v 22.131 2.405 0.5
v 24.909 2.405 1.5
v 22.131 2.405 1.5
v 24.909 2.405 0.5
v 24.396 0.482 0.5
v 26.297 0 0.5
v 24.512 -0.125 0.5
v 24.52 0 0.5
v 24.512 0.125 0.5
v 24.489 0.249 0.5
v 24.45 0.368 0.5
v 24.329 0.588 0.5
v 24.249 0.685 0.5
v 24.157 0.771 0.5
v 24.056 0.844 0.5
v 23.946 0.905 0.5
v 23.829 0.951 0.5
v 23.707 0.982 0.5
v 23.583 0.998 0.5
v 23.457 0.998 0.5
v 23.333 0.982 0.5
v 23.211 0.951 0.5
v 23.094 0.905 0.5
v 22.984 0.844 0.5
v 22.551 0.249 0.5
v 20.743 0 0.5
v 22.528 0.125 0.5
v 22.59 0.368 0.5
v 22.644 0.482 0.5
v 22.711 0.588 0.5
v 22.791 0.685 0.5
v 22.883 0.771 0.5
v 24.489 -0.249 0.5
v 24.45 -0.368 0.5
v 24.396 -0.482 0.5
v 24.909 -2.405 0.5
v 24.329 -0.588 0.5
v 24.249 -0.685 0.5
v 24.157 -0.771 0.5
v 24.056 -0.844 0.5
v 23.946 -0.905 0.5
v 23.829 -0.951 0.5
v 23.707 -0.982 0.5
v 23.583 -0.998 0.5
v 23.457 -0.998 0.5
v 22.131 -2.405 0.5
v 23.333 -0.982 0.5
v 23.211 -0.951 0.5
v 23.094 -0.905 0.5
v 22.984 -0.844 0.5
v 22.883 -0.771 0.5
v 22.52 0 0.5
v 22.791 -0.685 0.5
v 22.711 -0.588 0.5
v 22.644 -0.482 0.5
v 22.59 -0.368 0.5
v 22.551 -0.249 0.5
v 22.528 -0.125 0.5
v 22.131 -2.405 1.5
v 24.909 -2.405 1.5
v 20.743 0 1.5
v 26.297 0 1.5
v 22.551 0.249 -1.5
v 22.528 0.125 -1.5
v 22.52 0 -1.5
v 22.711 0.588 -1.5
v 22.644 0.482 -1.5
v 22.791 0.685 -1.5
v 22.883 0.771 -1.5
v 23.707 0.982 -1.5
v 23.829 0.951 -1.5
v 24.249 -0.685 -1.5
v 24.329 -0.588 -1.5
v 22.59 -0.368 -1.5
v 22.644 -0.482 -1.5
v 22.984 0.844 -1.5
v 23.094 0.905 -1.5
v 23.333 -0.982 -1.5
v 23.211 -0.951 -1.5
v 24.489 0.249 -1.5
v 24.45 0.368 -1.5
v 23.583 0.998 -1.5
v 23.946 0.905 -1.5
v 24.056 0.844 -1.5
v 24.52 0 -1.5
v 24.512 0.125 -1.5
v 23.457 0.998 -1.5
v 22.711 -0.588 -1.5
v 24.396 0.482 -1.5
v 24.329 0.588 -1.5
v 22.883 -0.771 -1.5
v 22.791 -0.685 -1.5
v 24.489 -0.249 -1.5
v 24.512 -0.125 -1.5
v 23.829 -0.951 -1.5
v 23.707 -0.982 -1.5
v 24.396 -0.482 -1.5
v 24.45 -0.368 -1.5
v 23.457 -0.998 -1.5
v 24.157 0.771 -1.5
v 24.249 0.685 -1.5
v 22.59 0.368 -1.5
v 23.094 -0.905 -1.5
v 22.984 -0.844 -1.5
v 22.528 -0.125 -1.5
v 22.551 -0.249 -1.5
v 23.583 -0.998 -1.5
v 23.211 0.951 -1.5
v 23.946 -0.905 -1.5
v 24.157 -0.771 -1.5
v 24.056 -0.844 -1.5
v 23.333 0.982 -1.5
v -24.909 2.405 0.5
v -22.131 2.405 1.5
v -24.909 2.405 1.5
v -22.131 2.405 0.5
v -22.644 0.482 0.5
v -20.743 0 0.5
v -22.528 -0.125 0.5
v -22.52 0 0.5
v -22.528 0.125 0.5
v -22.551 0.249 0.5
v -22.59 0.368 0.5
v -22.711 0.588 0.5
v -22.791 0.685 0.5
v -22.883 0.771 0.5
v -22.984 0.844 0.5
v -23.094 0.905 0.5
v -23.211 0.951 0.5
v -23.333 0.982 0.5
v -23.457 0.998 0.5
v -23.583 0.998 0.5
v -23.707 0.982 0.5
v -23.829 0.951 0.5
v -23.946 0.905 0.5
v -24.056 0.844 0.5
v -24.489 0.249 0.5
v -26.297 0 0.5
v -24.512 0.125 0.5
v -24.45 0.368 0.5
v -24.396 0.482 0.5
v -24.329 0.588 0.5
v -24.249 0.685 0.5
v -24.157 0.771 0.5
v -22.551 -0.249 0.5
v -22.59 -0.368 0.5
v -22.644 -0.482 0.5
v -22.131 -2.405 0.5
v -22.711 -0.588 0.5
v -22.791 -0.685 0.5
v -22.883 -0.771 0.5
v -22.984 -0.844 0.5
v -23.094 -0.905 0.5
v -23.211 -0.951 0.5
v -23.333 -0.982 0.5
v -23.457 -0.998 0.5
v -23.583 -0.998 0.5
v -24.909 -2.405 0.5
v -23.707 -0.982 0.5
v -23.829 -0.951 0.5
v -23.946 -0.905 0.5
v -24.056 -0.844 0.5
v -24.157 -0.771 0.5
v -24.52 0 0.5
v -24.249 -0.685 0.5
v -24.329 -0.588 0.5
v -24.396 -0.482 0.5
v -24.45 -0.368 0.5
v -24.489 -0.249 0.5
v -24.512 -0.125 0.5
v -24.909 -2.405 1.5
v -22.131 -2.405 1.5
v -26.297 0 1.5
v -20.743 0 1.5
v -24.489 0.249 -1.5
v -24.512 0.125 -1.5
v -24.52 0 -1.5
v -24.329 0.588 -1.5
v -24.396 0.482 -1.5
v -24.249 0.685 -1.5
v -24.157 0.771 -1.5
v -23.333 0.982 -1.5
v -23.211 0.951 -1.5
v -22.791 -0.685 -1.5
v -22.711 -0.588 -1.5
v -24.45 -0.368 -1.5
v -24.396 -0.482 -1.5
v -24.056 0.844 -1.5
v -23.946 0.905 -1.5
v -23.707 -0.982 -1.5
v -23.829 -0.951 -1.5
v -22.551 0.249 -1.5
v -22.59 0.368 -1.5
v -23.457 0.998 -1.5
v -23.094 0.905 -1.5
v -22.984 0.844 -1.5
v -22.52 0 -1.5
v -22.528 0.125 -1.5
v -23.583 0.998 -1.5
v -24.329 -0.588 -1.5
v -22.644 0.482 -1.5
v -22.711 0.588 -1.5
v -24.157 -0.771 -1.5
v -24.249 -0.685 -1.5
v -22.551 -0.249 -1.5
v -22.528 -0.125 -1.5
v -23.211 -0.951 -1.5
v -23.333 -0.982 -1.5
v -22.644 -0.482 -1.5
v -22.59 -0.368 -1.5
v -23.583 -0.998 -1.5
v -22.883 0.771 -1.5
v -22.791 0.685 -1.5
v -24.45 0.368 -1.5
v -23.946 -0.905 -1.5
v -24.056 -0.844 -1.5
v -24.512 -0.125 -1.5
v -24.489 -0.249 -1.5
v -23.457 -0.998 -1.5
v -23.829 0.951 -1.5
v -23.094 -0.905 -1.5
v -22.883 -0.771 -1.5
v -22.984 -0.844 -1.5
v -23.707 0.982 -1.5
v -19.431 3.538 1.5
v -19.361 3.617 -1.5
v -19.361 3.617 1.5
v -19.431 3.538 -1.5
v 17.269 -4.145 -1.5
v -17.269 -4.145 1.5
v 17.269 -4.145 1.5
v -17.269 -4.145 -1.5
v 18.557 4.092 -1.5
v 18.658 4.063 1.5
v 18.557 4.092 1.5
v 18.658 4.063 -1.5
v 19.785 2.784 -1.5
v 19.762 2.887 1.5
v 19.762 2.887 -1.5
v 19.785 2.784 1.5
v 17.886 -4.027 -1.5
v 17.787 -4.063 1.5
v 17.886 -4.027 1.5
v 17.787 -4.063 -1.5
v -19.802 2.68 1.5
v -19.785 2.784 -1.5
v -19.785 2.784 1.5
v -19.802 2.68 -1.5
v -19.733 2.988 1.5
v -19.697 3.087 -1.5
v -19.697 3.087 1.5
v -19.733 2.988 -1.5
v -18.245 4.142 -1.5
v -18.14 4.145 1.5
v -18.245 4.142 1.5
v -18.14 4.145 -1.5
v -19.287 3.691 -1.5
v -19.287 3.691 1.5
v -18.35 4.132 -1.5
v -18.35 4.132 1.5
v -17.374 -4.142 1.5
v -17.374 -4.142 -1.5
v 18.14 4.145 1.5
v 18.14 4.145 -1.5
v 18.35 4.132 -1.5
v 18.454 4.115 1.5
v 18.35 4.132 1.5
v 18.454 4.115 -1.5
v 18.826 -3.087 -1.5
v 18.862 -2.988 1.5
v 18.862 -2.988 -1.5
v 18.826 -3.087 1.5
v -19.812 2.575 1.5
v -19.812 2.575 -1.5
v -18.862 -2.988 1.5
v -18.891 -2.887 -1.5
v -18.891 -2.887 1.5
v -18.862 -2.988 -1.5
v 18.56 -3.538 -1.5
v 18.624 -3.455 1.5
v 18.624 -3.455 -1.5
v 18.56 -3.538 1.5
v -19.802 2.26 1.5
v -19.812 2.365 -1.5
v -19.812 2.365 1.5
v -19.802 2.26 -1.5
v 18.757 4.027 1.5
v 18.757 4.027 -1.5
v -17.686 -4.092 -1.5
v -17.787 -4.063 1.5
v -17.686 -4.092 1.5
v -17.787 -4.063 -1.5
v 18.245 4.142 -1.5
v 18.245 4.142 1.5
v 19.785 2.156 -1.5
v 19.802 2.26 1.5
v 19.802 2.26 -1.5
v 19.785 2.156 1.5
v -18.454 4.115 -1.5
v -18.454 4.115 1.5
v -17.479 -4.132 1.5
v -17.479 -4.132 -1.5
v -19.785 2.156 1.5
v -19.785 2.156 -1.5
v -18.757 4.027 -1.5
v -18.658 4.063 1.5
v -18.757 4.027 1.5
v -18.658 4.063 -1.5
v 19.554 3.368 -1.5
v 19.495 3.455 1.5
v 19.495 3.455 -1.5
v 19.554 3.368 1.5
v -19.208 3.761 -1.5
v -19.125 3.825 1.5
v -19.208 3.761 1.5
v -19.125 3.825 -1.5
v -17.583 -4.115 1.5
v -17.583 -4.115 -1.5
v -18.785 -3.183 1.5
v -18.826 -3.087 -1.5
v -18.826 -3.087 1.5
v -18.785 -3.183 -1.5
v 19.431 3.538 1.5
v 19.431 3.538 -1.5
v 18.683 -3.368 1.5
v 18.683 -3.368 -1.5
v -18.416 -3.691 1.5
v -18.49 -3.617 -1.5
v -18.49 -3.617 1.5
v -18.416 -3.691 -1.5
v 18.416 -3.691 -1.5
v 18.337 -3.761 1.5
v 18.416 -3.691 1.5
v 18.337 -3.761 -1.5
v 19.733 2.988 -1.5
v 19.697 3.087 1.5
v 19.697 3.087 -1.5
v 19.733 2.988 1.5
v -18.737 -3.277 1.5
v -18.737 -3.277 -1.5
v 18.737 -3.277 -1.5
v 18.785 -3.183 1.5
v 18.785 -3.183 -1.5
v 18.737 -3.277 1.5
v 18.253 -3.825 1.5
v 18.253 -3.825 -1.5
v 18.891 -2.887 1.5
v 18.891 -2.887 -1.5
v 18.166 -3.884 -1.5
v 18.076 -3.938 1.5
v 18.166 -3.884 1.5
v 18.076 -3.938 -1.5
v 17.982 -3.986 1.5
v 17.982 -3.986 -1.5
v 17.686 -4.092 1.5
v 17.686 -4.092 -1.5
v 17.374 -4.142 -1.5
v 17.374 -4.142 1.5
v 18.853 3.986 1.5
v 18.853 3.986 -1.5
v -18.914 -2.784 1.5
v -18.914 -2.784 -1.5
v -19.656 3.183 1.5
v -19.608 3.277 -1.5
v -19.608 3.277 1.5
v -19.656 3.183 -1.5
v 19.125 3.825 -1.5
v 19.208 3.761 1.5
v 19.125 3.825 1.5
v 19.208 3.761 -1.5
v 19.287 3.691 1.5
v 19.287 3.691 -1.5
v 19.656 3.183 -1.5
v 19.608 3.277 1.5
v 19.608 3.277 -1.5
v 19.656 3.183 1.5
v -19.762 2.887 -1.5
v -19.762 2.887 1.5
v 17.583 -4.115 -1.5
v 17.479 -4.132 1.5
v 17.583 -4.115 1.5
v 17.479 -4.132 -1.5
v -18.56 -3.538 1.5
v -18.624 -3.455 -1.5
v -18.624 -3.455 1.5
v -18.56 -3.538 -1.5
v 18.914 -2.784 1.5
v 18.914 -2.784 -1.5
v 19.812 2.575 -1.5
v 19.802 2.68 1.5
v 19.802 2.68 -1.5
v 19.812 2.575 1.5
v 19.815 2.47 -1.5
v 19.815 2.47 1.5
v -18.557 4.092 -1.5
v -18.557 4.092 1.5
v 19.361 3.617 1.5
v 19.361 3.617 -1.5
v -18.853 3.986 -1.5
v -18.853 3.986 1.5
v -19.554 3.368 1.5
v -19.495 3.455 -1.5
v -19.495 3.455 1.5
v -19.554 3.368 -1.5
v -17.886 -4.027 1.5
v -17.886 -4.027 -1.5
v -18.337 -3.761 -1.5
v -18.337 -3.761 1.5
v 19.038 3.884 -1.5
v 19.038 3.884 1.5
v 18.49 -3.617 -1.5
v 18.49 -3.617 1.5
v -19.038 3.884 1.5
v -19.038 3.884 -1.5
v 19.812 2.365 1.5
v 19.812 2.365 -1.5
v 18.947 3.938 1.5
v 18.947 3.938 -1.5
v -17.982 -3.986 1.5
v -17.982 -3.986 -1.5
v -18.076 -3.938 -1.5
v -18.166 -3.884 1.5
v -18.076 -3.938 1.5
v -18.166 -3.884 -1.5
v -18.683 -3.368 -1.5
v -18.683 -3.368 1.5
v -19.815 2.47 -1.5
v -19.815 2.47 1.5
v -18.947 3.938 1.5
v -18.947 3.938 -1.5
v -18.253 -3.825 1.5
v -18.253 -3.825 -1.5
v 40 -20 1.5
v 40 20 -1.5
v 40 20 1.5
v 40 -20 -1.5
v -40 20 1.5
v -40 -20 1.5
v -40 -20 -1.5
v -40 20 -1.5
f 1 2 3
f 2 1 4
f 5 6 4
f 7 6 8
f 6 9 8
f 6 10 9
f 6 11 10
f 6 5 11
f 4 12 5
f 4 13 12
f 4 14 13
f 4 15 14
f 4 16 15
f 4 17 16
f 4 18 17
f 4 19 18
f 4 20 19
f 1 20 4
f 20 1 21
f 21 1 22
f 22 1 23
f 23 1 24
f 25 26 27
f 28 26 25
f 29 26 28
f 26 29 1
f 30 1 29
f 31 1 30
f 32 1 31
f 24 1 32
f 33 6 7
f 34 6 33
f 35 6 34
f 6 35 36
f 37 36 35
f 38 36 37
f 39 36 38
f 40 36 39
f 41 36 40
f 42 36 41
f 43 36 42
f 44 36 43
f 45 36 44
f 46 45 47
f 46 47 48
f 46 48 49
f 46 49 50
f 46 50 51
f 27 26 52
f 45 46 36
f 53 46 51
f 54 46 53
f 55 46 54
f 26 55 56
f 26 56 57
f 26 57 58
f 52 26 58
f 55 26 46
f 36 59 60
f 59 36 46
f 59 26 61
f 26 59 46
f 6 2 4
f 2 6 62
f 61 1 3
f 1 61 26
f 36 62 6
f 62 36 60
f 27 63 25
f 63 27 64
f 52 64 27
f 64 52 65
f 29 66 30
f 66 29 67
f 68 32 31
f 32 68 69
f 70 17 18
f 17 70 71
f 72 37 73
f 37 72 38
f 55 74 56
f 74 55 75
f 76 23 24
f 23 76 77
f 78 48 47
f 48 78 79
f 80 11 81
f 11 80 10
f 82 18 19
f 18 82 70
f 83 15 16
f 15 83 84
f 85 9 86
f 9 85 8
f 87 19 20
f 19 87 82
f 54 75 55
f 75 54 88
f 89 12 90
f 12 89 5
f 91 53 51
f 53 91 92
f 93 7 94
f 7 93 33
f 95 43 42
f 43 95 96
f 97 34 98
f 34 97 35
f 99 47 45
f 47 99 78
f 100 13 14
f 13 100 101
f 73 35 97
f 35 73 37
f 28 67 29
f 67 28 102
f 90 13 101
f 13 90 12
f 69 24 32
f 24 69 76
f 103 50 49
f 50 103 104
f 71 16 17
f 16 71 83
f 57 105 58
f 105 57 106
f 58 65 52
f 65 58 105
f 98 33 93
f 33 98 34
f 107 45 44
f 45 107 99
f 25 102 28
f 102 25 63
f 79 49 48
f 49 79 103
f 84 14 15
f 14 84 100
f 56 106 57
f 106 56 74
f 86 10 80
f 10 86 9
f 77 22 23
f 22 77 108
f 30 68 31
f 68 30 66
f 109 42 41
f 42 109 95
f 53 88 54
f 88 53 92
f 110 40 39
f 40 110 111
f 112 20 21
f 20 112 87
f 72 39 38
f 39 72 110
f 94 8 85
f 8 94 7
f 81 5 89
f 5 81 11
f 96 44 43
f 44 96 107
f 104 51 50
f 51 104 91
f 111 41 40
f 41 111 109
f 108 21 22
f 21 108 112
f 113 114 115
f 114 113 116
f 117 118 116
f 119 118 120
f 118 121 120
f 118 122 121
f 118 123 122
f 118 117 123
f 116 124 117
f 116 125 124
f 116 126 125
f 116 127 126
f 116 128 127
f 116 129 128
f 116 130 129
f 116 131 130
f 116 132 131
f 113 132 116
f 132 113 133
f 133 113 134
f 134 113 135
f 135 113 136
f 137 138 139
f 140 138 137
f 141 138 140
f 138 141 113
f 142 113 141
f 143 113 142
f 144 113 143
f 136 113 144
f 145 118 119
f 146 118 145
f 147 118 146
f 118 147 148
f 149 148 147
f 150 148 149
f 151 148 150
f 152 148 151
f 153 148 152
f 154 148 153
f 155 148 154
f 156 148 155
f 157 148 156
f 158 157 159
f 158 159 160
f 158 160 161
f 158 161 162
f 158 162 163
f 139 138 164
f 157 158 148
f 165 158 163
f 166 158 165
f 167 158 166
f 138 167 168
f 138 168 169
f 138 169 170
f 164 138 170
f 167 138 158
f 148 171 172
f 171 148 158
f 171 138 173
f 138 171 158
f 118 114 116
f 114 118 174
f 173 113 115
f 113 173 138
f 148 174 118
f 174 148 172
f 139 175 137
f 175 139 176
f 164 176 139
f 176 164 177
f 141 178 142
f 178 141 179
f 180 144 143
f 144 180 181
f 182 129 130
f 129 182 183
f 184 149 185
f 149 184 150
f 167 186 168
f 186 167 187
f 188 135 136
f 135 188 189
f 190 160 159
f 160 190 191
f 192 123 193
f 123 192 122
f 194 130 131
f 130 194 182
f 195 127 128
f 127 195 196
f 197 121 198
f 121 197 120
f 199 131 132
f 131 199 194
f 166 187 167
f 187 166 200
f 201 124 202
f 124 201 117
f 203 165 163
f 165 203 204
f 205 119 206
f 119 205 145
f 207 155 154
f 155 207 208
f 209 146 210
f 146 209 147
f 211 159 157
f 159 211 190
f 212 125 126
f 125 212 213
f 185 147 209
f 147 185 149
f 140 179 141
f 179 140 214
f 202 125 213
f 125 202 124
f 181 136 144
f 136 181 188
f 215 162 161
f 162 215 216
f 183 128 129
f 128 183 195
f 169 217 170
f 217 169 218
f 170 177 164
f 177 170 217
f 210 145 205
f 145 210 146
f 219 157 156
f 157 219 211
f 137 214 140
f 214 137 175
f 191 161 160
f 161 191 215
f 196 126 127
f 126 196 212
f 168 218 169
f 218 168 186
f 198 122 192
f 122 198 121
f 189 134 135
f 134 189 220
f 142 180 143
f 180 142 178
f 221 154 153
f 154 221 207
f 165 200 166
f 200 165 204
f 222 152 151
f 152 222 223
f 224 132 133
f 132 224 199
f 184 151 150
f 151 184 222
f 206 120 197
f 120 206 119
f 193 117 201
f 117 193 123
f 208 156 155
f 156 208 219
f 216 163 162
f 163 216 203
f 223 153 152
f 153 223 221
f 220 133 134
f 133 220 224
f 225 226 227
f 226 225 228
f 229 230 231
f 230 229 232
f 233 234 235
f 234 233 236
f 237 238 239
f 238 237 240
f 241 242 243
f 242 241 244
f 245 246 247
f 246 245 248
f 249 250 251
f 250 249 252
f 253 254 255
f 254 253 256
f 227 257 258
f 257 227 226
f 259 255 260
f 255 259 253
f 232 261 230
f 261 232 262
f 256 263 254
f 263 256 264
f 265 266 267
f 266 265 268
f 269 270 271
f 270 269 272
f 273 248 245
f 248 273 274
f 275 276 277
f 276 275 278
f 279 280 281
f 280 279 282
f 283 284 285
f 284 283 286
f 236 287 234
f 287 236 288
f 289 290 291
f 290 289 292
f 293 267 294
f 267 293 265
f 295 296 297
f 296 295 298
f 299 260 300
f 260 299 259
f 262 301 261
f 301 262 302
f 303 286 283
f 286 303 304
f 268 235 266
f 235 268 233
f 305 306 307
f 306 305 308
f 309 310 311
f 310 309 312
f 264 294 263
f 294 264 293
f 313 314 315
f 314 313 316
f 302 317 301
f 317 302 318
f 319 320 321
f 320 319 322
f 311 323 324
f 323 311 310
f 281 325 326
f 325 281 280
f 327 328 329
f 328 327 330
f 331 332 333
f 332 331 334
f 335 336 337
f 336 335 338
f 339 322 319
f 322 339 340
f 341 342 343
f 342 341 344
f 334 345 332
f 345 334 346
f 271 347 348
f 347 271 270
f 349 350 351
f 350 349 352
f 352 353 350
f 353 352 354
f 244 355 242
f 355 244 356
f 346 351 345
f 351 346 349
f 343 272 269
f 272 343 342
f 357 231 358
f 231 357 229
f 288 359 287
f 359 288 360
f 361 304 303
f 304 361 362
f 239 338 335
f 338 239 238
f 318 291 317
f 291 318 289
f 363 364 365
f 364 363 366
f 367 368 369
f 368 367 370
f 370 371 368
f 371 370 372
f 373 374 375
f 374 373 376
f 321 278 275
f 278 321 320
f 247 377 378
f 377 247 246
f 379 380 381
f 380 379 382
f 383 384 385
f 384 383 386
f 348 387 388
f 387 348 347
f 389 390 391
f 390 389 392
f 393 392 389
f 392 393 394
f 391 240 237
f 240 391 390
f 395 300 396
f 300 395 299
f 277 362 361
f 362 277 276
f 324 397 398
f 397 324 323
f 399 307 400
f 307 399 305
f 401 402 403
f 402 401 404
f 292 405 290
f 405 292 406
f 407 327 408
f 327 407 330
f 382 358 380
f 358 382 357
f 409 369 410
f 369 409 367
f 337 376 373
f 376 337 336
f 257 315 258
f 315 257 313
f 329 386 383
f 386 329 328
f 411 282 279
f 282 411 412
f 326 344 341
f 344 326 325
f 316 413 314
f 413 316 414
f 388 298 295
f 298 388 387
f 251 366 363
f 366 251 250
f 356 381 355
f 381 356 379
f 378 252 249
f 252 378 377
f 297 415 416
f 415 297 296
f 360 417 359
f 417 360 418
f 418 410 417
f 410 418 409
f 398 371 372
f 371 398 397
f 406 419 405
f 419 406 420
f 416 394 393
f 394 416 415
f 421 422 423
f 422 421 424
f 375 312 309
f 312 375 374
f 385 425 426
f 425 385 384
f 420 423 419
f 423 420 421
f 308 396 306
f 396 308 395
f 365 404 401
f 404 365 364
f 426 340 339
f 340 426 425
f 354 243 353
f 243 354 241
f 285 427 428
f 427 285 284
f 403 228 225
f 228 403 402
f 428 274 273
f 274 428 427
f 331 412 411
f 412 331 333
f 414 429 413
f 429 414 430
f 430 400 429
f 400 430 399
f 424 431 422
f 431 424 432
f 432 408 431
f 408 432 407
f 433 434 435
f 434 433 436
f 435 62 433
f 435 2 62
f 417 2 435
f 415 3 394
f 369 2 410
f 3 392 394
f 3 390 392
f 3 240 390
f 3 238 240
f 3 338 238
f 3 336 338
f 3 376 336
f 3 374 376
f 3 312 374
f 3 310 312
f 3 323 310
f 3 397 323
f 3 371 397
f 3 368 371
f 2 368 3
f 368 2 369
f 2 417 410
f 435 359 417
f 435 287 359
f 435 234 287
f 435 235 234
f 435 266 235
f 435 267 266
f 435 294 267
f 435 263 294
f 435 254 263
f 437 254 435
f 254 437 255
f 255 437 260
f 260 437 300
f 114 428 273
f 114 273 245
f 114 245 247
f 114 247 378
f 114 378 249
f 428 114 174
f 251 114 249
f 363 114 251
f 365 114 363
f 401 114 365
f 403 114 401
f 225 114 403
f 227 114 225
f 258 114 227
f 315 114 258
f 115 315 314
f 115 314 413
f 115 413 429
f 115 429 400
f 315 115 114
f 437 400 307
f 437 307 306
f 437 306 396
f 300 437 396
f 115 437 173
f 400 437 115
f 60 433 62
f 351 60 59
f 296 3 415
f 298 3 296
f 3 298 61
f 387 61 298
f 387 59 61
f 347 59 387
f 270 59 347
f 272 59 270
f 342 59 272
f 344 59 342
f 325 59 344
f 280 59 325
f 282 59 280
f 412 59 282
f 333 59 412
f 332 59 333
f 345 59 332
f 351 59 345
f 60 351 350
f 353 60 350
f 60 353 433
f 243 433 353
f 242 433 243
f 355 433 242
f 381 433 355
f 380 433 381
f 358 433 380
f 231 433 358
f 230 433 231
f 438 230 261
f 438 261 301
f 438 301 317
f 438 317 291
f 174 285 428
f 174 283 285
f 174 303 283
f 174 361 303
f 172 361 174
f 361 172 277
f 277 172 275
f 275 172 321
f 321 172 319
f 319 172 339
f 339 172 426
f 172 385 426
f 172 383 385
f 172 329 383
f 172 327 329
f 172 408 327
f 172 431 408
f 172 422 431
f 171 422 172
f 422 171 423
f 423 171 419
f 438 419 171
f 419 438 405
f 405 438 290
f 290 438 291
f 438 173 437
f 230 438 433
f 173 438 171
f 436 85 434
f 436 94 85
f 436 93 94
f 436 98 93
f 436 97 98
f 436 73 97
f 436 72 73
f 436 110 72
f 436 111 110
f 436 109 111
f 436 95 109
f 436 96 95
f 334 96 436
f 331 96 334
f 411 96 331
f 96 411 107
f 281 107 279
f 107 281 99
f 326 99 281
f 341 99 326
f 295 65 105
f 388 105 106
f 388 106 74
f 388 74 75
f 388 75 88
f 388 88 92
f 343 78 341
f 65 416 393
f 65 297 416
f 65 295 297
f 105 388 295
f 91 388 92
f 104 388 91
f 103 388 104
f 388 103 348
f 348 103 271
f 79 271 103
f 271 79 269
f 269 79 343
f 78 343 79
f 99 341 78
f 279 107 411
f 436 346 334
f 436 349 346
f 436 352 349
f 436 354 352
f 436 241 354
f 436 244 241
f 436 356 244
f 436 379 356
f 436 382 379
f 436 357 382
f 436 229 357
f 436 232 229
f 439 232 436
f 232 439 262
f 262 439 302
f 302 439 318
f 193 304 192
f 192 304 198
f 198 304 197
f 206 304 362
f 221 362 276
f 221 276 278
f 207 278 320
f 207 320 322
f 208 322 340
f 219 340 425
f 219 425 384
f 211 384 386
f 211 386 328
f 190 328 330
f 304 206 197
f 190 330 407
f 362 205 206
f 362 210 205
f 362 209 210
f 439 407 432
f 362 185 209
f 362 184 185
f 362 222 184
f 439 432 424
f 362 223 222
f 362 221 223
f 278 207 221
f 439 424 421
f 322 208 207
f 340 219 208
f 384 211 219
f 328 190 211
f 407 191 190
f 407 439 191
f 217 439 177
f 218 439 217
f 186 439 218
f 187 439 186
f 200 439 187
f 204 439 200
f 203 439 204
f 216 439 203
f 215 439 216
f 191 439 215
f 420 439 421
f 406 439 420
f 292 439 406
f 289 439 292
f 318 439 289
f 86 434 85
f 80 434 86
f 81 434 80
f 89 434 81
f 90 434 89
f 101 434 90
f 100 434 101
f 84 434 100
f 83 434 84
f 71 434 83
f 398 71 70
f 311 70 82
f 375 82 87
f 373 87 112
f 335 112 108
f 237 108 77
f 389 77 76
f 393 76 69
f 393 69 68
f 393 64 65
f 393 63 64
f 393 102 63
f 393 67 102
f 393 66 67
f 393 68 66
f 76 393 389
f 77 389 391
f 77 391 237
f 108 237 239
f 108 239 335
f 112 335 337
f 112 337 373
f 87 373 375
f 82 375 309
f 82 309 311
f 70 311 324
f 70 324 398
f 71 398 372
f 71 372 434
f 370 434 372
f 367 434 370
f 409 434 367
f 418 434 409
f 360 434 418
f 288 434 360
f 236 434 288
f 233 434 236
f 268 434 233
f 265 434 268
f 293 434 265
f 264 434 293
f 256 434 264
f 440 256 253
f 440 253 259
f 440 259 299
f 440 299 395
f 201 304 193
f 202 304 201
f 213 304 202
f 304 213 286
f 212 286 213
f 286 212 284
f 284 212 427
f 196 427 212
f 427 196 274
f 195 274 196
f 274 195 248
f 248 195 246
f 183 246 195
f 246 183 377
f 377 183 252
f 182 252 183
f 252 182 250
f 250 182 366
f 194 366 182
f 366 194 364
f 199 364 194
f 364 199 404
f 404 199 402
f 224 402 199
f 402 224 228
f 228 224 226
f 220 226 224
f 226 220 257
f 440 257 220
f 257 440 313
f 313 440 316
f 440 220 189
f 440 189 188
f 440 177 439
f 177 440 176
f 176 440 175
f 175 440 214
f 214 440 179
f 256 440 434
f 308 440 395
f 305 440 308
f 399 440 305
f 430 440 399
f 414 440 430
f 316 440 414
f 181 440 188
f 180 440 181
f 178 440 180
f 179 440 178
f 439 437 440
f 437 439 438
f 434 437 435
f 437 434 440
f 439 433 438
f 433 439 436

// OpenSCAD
// file: ../../lib/material.scad
module gray() {
	color([.4, .4, .4]) children([0:$children-1]);
}

module black() {
	color([.3, .3, .3]) children([0:$children-1]);
}

module orange() {
	color([1, .7, 0]) children([0:$children-1]);
}

module yellow() {
	color([.7, .7, .3]) children([0:$children-1]);
}

module green_pcb() {
	color([.0, .5, .25]) children([0:$children-1]);
}

module metal() {
	color([.7, .7, .7]) children([0:$children-1]);
}

module gold() {
	color([.8, .5, .0]) children([0:$children-1]);
}

module stainless(no="1.4301") {
	color([0.45, 0.43, 0.5]) children([0:$children-1]);
}

module steel(no) {
	color([0.65, 0.67, 0.72]) children([0:$children-1]);
}

module iron(no="ST37") {
	color([0.36, 0.33, 0.33]) children([0:$children-1]);
}

module plastic() {
	color([1, .7, 0]) children([0:$children-1]);
}
// file: ../../lib/bolt/metric_bolt.scad
include <bolt.scad>;

// https://www.fairburyfastener.com/xdims_metric_nuts.htm

//  hex_nut (height, thread_d, size, tolerance, quality, thread, pitch);
//hex_nut (1/8, 1/4, 3/8, 1/128, 32, 1, "imperial", 28);

/*
    hex_nut (height, thread_d, size, tolerance, quality, bool_cut, thread, pitch);
        height      =   height of the nut
        thread_d    =   threaded hole diameter width
        size        =   [ 0.00, 0.00, 0.00 ]hexagonal nut size
        tolerance   =   tolerance of entire measures (always positive, addition and subtraction already
                        calculated within the script
        quality     =   overall quality of the returned function (ref. $fn)
        bool_cut    =   do (1) or not (0) the nut cut
        *thread     =   string variable declaring measure type -> "metric" or "imperial"
        *pitch      =   stands for thread pitch      
*/

module m2_hex_nut() {
  hex_nut(1.6, 2, 4.32, 0.01, 32, 1, "metric", 0.4);
}

module m2_5_hex_nut() {
  hex_nut(2, 2.5, 5.45, 0.01, 32, 1, "metric", 0.45);
}

module m3_hex_nut() {
  hex_nut(2.3, 3, 6.01, 0.01, 32, 1, "metric", 0.5);
}

module m4_hex_nut() {
  hex_nut(3.2, 4, 7.66, 0.01, 32, 1, "metric", 0.7);
}

module m5_hex_nut() {
  hex_nut(4.7, 5, 8.79, 0.01, 32, 1, "metric", 0.8);
}

module m6_hex_nut() {
  hex_nut(5.2, 6, 11.05, 0.01, 32, 1, "metric", 1);
}

module m8_hex_nut() {
  hex_nut(6.8, 8, 14.38, 0.01, 32, 1, "metric", 1.25);
}

module m10_hex_nut() {
  hex_nut(8.4, 10, 17.77, 0.01, 32, 1, "metric", 1.5);
}

//  hex_bolt (lenght, thread_d, head_h, head_d, tolerance, quality, thread, pitch);

/*
    hex_bolt (lenght, thread_d, head_h, head_d, tolerance, quality, bool_cut, thread, pitch);
        lenght      =   threaded bar lenght
        thread_d    =   threaded bar diameter width
        head_h      =   hexagonal bolt head height
        head_d      =   hexagonal bolt head size
        tolerance   =   tolerance of entire measures (always positive, addition and subtraction already
                        calculated within the script
        quality     =   overall quality of the returned function (ref. $fn)
        bool_cut    =   do (1) or not (0) the nut cut
        *thread     =   string variable declaring measure type -> "metric" or "imperial"
        *pitch      =   stands for thread pitch
*/

module m2_hex_bolt(lenght=26,head_h=2) {
  translate([0, 0, -lenght])
    hex_bolt(lenght, 2, head_h, 4.32, 0.1, 32, 1, "metric", 0.4);
}

module m2_5_hex_bolt(lenght=26,head_h=2) {
  translate([0, 0, -lenght])
    hex_bolt(lenght, 2.5, head_h, 5.45, 0.1, 32, 1, "metric", 0.45);
}

module m3_hex_bolt(lenght=26,head_h=2) {
  translate([0, 0, -lenght])
    hex_bolt(lenght, 3, head_h, 6.01, 0.1, 32, 1, "metric", 0.5);
}

module m4_hex_bolt(lenght=26,head_h=2) {
  translate([0, 0, -lenght])
    hex_bolt(lenght, 4, head_h, 7.66, 0.1, 32, 1, "metric", 0.7);
}

module m5_hex_bolt(lenght=26,head_h=2) {
  translate([0, 0, -lenght])
    hex_bolt(lenght, 5, head_h, 8.79, 0.1, 32, 1, "metric", 0.8);
}

module m6_hex_bolt(lenght=26,head_h=2) {
  translate([0, 0, -lenght])
    hex_bolt(lenght, 6, head_h, 11.05, 0.1, 32, 1, "metric", 1);
}

module m8_hex_bolt(lenght=26,head_h=6.8) {
  translate([0, 0, -lenght])
    hex_bolt(lenght, 8, head_h, 14.38, 0.1, 32, 1, "metric", 1.25);
}

module m10_hex_bolt(lenght=26,head_h=8.4) {
  translate([0, 0, -lenght])
    hex_bolt(lenght, 10, head_h, 17.77, 0.1, 32, 1, "metric", 1.5);
}

//m8_hex_bolt_extrude(20, 1, 0.1);

module m1_6_hex_bolt_extrude(depth, head, clear) {
  translate([0,0,-depth/2]) hex_bolt_extrude(depth, head, 1.6, 3.41, clear);
}

module m2_hex_bolt_extrude(depth, head, clear) {
  translate([0,0,-depth/2]) hex_bolt_extrude(depth, head, 2, 4.32, clear);
}

module m2_5_hex_bolt_extrude(depth, head, clear) {
  translate([0,0,-depth/2]) hex_bolt_extrude(depth, head, 2.5, 5.45, clear);
}

module m3_hex_bolt_extrude(depth, head, clear) {
  translate([0,0,-depth/2]) hex_bolt_extrude(depth, head, 3, 6.01, clear);
}

module m4_hex_bolt_extrude(depth, head, clear) {
  translate([0,0,-depth/2]) hex_bolt_extrude(depth, head, 4, 7.66, clear);
}

module m5_hex_bolt_extrude(depth, head, clear) {
  translate([0,0,-depth/2]) hex_bolt_extrude(depth, head, 5, 8.79, clear);
}

module m6_hex_bolt_extrude(depth, head, clear) {
  translate([0,0,-depth/2]) hex_bolt_extrude(depth, head, 6, 11.05, clear);
}

module m8_hex_bolt_extrude(depth, head, clear) {
  translate([0,0,-depth/2]) hex_bolt_extrude(depth, head, 8, 14.38, clear);
}

module m10_hex_bolt_extrude(depth, head, clear) {
  translate([0,0,-depth/2]) hex_bolt_extrude(depth, head, 10, 17.77, clear);
}

module hex_bolt_extrude(depth, head_h, body, head, clear) {
  translate([0,0,head_h/2]) rotate([0, 0, 90]) hex_head_extrude(head_h, head, clear);
  translate([0,0,head_h]) bolt_body_extrude(depth-head_h+clear, body, clear);
}

module bolt_body_extrude(height, diameter, clear) {
    radius = diameter/2+clear*2;
    cylinder(h=height, r1=radius, r2=radius, center=false, $fn=50);
}

module hex_head_extrude(height, diameter, clear) {
    height = height+clear;
	radius = diameter+1+clear*4;
    angle = 360/6;
	cote = (radius)/tan(angle);

	union() {
		rotate([0,0,0])
			cube([radius,cote,height],center=true);
		rotate([0,0,angle])
			cube([radius,cote,height],center=true);
		rotate([0,0,2*angle])
			cube([radius,cote,height],center=true);
	}
}
// file: ../../lib/nut/nut_hexagonal.scad
//nut_M(3,1,0.1);
//nut_M(6,1,0.1);
//nut_M_border(6,10,3,0.1);

module nut_M(size,height,clear)
{
    nut_hexagonal(size,height,clear);
}

module nut_M_border(size,radius,height,clear)
{
    difference() {
        //cylinder(r=radius, h=height,center=true);
        nut_hexagonal(radius,height,clear);
        nut_hexagonal(size,height,clear);
    }
}

module nut_hexagonal(radius,height,clear)
{
    height = height+clear;
	radius = radius+clear;
    angle = 360/6;
	cote = (radius)/tan(angle);

	union()
    {
		rotate([0,0,0])
			cube([radius,cote,height],center=true);
		rotate([0,0,angle])
			cube([radius,cote,height],center=true);
		rotate([0,0,2*angle])
			cube([radius,cote,height],center=true);
	}
}
// file: ../../lib/plate.scad
include <./material.scad>;

module plate(height=50, width=50, depth=10) {
  plastic() {
    cube([height, width, depth], true);
  }
}
// file: ../../lib/connector/connector_dsub.scad
/*
Inspired by D-Sub connector library by 'dpeart'
http://forums.reprap.org/read.php?313,577003
*/

sides = 100;

include <../nut/nut_hexagonal.scad>;
include <../bolt/metric_bolt.scad>;

//connector_dsub_9F(3,0.1);
//connector_dsub_9R(3,0.1);
//connector_dsub_15F(3,0.1);
//connector_dsub_15R(3,0.1);
//connector_dsub_25F(3,0.1);
//connector_dsub_25R(3,0.1);
//connector_dsub_37F(3,0.1);
//connector_dsub_37R(3,0.1);
//connector_dsub_50F(3,0.1);
//connector_dsub_50R(10,0.1);

module connector_dsub_9F_extrusion(depth,clear)
{
    dimensions = [12.50,11.10,6.53,2.11];
    connector_dsub_extrusion(dimensions,depth,clear);
}

module connector_dsub_9R_extrusion(depth,clear)
{
    dimensions = [12.50,11.10,5.72,3.35];
    connector_dsub_extrusion(dimensions,depth,clear);
}

module connector_dsub_15F_extrusion(depth,clear)
{
    dimensions = [16.66,15.27,6.53,2.11];
    connector_dsub_extrusion(dimensions,depth,clear);
}

module connector_dsub_15R_extrusion(depth,clear)
{
    dimensions = [16.66,15.27,5.72,3.35];
    connector_dsub_extrusion(dimensions,depth,clear);
}

module connector_dsub_25F_extrusion(depth,clear)
{
    dimensions = [23.52,22.15,6.53,2.11];
    connector_dsub_extrusion(dimensions,depth,clear);
}

module connector_dsub_25R_extrusion(depth,clear)
{
    dimensions = [23.52,21.39,5.72,3.35];
    connector_dsub_extrusion(dimensions,depth,clear);
}

module connector_dsub_37F_extrusion(depth,clear)
{
    dimensions = [31.75,29.54,6.53,2.11];
    connector_dsub_extrusion(dimensions,depth,clear);
}

module connector_dsub_37R_extrusion(depth,clear)
{
    dimensions = [31.75,29.54,5.72,3.35];
    connector_dsub_extrusion(dimensions,depth,clear);
}

module connector_dsub_50F_extrusion(depth,clear)
{
    dimensions = [30.56,29.19,7.93,2.11];
    connector_dsub_extrusion(dimensions,depth,clear);
}

module connector_dsub_50R_extrusion(depth,clear)
{
    dimensions = [30.56,28.17,7.06,3.35];
    connector_dsub_extrusion(dimensions,depth,clear);
}

module connector_dsub_extrusion(dimensions,depth,clear)
{
    
    b = dimensions[0];
    d = dimensions[1];
    f = dimensions[2];
    k = dimensions[3];
    h = depth+clear;
    g = clear;

    cut_angle = 10;
    mounting_hole = 3.05;
    o = 2*(g+f-k)*tan(cut_angle);

        union()
        {
            hull()
            {
                translate([-(g+d-k),(g+f-k),-h/2])
                    cylinder(h=h, d=k, $fn=sides);
                translate([(g+d-k),(g+f-k),-h/2])
                    cylinder(h=h, d=k, $fn=sides);
                translate([-(g+d-k)+o,-(g+f-k),-h/2])
                    cylinder(h=h, d=k, $fn=sides);
                translate([(g+d-k)-o,-(g+f-k),-h/2])
                    cylinder(h=h, d=k, $fn=sides);
            }

            translate([-b,0,0])
                m1_6_hex_bolt_extrude(h, 1, 0.1);

            translate([b,0,0])
                m1_6_hex_bolt_extrude(h, 1, 0.1);
        }
}
// main file
include <../../lib/connector/connector_dsub.scad>;
include <../../lib/plate.scad>;

difference() {
    plate(80,40,3);
    rotate([0,180,0]) {
        connector_dsub_25R_extrusion(3,0.1);
    }
}
